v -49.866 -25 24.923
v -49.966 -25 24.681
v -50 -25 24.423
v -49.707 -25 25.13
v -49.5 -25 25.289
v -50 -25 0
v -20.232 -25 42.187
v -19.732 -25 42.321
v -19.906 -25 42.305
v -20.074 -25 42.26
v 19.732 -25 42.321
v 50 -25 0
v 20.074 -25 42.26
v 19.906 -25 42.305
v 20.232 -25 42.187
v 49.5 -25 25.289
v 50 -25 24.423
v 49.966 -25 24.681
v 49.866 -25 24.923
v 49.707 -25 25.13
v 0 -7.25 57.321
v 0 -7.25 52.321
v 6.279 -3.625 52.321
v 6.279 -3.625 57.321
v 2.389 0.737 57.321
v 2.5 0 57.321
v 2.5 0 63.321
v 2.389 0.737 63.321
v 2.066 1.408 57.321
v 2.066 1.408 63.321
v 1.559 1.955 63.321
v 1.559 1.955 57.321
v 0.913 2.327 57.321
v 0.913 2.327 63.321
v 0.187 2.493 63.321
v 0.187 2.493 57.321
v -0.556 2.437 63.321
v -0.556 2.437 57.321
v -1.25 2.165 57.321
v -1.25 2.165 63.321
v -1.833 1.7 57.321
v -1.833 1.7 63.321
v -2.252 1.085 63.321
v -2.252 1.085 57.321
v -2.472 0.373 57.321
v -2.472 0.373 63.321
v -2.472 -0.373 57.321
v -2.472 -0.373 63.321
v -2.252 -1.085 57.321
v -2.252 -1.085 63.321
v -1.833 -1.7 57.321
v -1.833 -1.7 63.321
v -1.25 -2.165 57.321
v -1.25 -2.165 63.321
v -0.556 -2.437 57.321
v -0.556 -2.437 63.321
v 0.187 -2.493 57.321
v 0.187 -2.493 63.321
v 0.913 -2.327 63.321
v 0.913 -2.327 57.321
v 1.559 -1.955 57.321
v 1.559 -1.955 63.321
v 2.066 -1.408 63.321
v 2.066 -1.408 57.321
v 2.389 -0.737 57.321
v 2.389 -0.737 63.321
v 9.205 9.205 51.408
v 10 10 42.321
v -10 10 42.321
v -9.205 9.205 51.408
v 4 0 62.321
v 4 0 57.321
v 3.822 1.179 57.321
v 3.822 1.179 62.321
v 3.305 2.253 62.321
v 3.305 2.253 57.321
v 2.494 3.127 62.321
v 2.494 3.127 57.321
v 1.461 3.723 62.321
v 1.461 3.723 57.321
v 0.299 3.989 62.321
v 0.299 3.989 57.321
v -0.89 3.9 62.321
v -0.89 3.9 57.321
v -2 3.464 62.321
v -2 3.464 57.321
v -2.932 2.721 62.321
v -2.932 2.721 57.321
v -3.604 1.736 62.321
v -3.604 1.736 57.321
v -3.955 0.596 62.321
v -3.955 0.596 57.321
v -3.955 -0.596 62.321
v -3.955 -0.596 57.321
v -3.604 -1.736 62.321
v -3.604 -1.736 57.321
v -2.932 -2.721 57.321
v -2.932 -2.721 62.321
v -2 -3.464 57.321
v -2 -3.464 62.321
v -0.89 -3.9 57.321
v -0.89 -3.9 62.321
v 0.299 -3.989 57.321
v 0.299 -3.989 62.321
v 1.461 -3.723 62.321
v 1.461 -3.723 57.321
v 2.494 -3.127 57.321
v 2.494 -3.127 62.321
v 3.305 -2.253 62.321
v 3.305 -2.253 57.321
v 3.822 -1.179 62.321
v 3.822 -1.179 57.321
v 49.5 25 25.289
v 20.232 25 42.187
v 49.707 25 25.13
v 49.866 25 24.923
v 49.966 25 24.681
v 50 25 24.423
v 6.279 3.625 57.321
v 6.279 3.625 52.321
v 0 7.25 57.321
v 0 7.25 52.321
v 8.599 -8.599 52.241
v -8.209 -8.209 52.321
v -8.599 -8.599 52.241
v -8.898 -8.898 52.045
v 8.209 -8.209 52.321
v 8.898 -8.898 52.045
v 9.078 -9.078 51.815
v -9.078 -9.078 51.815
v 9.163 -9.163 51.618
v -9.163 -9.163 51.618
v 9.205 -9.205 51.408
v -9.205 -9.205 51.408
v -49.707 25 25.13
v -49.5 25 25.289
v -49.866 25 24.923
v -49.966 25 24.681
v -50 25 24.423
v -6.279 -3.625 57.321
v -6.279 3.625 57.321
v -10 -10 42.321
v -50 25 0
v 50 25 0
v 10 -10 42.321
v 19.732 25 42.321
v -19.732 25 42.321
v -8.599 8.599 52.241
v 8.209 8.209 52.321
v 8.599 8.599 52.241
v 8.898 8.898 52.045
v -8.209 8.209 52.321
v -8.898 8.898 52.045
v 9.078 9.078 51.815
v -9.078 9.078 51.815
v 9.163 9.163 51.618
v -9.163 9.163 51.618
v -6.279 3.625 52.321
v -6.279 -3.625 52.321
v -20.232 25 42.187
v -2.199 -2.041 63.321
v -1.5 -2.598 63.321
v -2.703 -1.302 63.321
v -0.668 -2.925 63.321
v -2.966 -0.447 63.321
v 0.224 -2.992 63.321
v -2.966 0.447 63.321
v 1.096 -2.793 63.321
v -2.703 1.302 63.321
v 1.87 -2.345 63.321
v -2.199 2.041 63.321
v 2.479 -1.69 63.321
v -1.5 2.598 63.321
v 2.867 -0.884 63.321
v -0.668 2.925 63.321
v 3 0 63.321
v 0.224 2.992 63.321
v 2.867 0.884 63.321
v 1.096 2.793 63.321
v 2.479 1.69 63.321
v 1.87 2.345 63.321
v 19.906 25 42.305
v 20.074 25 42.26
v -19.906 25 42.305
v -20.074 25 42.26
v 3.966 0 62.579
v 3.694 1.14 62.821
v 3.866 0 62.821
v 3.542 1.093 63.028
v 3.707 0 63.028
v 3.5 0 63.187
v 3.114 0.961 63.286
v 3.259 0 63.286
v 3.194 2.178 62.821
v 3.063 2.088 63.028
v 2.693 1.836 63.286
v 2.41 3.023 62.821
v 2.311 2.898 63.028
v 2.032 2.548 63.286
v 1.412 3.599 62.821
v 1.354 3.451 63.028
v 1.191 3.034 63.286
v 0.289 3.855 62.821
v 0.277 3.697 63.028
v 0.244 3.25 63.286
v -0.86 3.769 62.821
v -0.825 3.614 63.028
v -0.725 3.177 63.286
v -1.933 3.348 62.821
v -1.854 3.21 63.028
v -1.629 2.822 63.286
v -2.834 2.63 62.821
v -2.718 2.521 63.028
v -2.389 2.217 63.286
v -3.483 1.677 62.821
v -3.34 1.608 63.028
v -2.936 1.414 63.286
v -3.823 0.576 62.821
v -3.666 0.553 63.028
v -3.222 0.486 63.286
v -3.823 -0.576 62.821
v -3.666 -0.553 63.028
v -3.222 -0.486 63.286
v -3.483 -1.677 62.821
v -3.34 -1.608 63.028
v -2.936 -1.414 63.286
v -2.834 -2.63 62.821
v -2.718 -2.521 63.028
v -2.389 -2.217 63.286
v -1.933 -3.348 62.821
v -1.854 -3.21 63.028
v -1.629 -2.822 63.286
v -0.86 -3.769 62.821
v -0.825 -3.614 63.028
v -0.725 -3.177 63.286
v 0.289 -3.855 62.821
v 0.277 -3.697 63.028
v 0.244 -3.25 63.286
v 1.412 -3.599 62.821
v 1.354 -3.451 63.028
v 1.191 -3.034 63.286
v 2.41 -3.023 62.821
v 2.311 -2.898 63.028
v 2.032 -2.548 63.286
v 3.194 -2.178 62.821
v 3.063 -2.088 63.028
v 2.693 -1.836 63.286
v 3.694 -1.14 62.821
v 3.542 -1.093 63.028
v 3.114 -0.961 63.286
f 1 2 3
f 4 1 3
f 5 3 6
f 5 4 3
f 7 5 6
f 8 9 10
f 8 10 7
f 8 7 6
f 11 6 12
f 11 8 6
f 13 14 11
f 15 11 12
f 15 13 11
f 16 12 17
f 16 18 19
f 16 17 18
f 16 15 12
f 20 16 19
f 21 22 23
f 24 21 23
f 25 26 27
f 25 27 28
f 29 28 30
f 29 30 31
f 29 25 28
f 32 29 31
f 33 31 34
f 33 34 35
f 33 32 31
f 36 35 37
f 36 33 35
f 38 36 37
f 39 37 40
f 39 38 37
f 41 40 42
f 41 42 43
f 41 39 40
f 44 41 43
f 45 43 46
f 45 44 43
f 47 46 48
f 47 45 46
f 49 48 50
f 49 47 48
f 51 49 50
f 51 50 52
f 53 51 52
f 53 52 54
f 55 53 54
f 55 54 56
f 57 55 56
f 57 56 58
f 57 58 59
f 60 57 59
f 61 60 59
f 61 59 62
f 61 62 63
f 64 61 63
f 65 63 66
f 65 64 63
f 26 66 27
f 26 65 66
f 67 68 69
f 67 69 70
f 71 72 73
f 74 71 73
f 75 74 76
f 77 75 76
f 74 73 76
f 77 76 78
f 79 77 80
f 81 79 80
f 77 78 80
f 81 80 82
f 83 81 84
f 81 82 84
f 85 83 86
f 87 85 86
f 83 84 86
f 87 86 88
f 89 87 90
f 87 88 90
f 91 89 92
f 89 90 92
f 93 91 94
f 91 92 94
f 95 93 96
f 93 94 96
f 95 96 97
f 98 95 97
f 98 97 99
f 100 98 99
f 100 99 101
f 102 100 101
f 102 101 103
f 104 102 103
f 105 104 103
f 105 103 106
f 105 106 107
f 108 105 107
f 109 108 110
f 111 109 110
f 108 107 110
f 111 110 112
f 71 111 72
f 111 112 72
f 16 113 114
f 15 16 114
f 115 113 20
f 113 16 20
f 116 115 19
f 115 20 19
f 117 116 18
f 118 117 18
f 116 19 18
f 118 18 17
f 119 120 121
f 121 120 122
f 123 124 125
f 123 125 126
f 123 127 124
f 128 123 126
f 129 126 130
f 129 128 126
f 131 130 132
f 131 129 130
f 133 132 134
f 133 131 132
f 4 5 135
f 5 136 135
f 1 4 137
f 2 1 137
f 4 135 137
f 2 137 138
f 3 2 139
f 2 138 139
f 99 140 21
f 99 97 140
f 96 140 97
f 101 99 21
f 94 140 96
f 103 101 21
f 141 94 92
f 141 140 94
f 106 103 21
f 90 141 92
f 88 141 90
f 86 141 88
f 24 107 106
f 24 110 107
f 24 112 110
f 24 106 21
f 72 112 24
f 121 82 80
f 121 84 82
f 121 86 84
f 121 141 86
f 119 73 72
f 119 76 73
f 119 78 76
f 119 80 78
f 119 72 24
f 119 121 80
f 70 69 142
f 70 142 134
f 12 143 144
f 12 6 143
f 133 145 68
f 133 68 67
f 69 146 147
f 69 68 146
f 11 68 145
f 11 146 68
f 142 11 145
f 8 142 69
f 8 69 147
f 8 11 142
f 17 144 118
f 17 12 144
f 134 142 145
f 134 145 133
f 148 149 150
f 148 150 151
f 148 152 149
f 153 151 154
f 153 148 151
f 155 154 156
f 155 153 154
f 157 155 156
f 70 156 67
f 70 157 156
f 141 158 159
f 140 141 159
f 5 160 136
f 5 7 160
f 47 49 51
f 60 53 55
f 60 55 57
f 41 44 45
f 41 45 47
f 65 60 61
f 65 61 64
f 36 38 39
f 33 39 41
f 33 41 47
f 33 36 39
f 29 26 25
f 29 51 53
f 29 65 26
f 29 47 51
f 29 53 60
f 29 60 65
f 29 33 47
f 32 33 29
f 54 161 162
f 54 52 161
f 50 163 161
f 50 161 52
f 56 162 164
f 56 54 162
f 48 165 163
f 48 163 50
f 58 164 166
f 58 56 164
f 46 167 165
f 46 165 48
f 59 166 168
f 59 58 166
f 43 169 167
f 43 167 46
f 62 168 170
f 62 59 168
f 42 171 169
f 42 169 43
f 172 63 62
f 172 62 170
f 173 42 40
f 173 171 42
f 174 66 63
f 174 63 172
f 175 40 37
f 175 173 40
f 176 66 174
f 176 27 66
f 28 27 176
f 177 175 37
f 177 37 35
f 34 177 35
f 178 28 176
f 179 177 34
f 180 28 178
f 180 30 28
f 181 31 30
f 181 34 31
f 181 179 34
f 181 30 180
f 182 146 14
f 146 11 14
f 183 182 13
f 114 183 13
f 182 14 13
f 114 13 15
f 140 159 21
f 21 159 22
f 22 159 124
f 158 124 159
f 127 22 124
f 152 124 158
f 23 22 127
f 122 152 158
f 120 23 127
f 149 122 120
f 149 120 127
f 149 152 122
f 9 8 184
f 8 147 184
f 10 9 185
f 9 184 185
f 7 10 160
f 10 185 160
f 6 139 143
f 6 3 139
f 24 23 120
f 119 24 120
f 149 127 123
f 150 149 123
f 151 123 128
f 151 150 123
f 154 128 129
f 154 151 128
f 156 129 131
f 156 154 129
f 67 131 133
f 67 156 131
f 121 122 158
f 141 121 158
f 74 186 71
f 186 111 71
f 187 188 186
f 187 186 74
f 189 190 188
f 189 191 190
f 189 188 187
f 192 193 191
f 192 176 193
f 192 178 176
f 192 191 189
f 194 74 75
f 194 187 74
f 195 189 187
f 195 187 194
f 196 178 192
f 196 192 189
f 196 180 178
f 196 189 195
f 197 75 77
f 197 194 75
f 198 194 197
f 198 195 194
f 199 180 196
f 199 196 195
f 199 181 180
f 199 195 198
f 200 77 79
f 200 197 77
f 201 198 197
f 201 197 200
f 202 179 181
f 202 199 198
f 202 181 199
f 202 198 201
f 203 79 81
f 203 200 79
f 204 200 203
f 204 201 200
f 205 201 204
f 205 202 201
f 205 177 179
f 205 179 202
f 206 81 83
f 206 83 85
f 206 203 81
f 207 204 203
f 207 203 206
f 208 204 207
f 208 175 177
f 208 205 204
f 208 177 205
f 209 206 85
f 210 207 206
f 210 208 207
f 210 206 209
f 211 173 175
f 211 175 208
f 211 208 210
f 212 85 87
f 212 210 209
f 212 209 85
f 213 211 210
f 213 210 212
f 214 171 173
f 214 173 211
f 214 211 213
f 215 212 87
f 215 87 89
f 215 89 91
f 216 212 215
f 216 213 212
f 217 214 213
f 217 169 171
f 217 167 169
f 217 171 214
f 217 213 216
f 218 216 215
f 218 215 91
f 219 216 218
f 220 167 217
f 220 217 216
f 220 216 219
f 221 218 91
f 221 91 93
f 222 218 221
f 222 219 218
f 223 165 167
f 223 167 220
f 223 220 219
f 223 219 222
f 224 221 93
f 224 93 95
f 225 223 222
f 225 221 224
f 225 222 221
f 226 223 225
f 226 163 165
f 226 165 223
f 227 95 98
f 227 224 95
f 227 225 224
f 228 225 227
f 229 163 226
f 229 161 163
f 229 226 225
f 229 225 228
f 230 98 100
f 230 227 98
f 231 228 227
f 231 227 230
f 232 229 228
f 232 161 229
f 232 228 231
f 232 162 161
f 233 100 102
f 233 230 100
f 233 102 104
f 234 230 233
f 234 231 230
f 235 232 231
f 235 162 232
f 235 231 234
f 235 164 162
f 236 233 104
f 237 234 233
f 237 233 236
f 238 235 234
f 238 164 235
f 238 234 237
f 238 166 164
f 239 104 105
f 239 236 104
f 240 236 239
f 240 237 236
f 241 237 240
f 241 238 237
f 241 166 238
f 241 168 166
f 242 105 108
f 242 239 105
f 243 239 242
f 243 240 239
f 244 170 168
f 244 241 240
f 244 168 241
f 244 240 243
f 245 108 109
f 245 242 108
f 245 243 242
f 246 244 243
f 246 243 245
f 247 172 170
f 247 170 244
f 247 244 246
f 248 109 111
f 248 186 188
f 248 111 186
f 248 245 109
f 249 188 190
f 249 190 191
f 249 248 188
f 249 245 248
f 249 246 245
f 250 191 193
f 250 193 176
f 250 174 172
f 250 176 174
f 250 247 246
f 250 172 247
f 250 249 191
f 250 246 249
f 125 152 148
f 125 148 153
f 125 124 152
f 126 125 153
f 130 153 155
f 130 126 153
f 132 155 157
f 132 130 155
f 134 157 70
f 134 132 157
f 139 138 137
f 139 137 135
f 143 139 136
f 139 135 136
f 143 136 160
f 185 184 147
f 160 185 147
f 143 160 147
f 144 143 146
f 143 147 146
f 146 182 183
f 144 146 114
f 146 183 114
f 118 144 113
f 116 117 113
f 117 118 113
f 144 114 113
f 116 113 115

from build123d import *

# Parameters (mm, degrees)
F1_DEPTH = 25
F2_W     = 20
F2_H     = 20
F3_DEPTH = 10
F3_TAPER = 5
F5_DEPTH = 5
F6_R     = 4
F6_R_2   = 2.5
F7_DEPTH = 6
F8_DEPTH = 45
F9_R     = 1
F10_R    = 1
F11_R    = 1


with BuildPart() as f1:
    # F0 (on Front) → F1 (new body, symmetric)
    with BuildSketch(Plane.XZ):
        Polygon((-50, 0), (0, 0), (50, 0), (50, 25), (20, 42.3205080757), (-20, 42.3205080757), (-50, 25), align=None)
    extrude(amount=F1_DEPTH, both=True)

    # F2 (on face) → F3 (join)
    with BuildSketch(Plane.XY.offset(42.3205080757)):
        Rectangle(F2_W, F2_H)
    extrude(amount=F3_DEPTH, taper=F3_TAPER)

    # F4 (on face) → F5 (join)
    with BuildSketch(Plane.XY.offset(52.3205080757)):
        Polygon((6.2786841774, 3.625), (0, 7.25), (-6.2786841774, 3.625), (-6.2786841774, -3.625), (0, -7.25), (6.2786841774, -3.625), align=None)
    extrude(amount=F5_DEPTH)

    # F6 (on face) → F7 (join)
    with BuildSketch(Plane.XY.offset(57.3205080757)):
        Circle(F6_R)
        Circle(F6_R_2, mode=Mode.SUBTRACT)
    extrude(amount=F7_DEPTH)

    # F8 (add): a face of the model
    f8_faces = [f1.faces().sort_by_distance(p)[0] for p in [
        (0, 0, 57.3205080757),
    ]]
    extrude(f8_faces, amount=-F8_DEPTH)

    # F9
    f9_edges = [f1.edges().sort_by_distance(p)[0] for p in [
        (9.125113, 0, 52.320508),
        (0, -9.125113, 52.320508),
        (-9.125113, 0, 52.320508),
        (0, 9.125113, 52.320508),
    ]]
    fillet(f9_edges, radius=F9_R)

    # F10
    f10_edges = [f1.edges().sort_by_distance(p)[0] for p in [
        (-4, 0, 63.320508),
    ]]
    fillet(f10_edges, radius=F10_R)

    # F11
    f11_edges = [f1.edges().sort_by_distance(p)[0] for p in [
        (-20, 0, 42.320508),
        (20, 0, 42.320508),
        (50, 0, 25),
        (-50, 0, 25),
    ]]
    fillet(f11_edges, radius=F11_R)


solid = f1.part
